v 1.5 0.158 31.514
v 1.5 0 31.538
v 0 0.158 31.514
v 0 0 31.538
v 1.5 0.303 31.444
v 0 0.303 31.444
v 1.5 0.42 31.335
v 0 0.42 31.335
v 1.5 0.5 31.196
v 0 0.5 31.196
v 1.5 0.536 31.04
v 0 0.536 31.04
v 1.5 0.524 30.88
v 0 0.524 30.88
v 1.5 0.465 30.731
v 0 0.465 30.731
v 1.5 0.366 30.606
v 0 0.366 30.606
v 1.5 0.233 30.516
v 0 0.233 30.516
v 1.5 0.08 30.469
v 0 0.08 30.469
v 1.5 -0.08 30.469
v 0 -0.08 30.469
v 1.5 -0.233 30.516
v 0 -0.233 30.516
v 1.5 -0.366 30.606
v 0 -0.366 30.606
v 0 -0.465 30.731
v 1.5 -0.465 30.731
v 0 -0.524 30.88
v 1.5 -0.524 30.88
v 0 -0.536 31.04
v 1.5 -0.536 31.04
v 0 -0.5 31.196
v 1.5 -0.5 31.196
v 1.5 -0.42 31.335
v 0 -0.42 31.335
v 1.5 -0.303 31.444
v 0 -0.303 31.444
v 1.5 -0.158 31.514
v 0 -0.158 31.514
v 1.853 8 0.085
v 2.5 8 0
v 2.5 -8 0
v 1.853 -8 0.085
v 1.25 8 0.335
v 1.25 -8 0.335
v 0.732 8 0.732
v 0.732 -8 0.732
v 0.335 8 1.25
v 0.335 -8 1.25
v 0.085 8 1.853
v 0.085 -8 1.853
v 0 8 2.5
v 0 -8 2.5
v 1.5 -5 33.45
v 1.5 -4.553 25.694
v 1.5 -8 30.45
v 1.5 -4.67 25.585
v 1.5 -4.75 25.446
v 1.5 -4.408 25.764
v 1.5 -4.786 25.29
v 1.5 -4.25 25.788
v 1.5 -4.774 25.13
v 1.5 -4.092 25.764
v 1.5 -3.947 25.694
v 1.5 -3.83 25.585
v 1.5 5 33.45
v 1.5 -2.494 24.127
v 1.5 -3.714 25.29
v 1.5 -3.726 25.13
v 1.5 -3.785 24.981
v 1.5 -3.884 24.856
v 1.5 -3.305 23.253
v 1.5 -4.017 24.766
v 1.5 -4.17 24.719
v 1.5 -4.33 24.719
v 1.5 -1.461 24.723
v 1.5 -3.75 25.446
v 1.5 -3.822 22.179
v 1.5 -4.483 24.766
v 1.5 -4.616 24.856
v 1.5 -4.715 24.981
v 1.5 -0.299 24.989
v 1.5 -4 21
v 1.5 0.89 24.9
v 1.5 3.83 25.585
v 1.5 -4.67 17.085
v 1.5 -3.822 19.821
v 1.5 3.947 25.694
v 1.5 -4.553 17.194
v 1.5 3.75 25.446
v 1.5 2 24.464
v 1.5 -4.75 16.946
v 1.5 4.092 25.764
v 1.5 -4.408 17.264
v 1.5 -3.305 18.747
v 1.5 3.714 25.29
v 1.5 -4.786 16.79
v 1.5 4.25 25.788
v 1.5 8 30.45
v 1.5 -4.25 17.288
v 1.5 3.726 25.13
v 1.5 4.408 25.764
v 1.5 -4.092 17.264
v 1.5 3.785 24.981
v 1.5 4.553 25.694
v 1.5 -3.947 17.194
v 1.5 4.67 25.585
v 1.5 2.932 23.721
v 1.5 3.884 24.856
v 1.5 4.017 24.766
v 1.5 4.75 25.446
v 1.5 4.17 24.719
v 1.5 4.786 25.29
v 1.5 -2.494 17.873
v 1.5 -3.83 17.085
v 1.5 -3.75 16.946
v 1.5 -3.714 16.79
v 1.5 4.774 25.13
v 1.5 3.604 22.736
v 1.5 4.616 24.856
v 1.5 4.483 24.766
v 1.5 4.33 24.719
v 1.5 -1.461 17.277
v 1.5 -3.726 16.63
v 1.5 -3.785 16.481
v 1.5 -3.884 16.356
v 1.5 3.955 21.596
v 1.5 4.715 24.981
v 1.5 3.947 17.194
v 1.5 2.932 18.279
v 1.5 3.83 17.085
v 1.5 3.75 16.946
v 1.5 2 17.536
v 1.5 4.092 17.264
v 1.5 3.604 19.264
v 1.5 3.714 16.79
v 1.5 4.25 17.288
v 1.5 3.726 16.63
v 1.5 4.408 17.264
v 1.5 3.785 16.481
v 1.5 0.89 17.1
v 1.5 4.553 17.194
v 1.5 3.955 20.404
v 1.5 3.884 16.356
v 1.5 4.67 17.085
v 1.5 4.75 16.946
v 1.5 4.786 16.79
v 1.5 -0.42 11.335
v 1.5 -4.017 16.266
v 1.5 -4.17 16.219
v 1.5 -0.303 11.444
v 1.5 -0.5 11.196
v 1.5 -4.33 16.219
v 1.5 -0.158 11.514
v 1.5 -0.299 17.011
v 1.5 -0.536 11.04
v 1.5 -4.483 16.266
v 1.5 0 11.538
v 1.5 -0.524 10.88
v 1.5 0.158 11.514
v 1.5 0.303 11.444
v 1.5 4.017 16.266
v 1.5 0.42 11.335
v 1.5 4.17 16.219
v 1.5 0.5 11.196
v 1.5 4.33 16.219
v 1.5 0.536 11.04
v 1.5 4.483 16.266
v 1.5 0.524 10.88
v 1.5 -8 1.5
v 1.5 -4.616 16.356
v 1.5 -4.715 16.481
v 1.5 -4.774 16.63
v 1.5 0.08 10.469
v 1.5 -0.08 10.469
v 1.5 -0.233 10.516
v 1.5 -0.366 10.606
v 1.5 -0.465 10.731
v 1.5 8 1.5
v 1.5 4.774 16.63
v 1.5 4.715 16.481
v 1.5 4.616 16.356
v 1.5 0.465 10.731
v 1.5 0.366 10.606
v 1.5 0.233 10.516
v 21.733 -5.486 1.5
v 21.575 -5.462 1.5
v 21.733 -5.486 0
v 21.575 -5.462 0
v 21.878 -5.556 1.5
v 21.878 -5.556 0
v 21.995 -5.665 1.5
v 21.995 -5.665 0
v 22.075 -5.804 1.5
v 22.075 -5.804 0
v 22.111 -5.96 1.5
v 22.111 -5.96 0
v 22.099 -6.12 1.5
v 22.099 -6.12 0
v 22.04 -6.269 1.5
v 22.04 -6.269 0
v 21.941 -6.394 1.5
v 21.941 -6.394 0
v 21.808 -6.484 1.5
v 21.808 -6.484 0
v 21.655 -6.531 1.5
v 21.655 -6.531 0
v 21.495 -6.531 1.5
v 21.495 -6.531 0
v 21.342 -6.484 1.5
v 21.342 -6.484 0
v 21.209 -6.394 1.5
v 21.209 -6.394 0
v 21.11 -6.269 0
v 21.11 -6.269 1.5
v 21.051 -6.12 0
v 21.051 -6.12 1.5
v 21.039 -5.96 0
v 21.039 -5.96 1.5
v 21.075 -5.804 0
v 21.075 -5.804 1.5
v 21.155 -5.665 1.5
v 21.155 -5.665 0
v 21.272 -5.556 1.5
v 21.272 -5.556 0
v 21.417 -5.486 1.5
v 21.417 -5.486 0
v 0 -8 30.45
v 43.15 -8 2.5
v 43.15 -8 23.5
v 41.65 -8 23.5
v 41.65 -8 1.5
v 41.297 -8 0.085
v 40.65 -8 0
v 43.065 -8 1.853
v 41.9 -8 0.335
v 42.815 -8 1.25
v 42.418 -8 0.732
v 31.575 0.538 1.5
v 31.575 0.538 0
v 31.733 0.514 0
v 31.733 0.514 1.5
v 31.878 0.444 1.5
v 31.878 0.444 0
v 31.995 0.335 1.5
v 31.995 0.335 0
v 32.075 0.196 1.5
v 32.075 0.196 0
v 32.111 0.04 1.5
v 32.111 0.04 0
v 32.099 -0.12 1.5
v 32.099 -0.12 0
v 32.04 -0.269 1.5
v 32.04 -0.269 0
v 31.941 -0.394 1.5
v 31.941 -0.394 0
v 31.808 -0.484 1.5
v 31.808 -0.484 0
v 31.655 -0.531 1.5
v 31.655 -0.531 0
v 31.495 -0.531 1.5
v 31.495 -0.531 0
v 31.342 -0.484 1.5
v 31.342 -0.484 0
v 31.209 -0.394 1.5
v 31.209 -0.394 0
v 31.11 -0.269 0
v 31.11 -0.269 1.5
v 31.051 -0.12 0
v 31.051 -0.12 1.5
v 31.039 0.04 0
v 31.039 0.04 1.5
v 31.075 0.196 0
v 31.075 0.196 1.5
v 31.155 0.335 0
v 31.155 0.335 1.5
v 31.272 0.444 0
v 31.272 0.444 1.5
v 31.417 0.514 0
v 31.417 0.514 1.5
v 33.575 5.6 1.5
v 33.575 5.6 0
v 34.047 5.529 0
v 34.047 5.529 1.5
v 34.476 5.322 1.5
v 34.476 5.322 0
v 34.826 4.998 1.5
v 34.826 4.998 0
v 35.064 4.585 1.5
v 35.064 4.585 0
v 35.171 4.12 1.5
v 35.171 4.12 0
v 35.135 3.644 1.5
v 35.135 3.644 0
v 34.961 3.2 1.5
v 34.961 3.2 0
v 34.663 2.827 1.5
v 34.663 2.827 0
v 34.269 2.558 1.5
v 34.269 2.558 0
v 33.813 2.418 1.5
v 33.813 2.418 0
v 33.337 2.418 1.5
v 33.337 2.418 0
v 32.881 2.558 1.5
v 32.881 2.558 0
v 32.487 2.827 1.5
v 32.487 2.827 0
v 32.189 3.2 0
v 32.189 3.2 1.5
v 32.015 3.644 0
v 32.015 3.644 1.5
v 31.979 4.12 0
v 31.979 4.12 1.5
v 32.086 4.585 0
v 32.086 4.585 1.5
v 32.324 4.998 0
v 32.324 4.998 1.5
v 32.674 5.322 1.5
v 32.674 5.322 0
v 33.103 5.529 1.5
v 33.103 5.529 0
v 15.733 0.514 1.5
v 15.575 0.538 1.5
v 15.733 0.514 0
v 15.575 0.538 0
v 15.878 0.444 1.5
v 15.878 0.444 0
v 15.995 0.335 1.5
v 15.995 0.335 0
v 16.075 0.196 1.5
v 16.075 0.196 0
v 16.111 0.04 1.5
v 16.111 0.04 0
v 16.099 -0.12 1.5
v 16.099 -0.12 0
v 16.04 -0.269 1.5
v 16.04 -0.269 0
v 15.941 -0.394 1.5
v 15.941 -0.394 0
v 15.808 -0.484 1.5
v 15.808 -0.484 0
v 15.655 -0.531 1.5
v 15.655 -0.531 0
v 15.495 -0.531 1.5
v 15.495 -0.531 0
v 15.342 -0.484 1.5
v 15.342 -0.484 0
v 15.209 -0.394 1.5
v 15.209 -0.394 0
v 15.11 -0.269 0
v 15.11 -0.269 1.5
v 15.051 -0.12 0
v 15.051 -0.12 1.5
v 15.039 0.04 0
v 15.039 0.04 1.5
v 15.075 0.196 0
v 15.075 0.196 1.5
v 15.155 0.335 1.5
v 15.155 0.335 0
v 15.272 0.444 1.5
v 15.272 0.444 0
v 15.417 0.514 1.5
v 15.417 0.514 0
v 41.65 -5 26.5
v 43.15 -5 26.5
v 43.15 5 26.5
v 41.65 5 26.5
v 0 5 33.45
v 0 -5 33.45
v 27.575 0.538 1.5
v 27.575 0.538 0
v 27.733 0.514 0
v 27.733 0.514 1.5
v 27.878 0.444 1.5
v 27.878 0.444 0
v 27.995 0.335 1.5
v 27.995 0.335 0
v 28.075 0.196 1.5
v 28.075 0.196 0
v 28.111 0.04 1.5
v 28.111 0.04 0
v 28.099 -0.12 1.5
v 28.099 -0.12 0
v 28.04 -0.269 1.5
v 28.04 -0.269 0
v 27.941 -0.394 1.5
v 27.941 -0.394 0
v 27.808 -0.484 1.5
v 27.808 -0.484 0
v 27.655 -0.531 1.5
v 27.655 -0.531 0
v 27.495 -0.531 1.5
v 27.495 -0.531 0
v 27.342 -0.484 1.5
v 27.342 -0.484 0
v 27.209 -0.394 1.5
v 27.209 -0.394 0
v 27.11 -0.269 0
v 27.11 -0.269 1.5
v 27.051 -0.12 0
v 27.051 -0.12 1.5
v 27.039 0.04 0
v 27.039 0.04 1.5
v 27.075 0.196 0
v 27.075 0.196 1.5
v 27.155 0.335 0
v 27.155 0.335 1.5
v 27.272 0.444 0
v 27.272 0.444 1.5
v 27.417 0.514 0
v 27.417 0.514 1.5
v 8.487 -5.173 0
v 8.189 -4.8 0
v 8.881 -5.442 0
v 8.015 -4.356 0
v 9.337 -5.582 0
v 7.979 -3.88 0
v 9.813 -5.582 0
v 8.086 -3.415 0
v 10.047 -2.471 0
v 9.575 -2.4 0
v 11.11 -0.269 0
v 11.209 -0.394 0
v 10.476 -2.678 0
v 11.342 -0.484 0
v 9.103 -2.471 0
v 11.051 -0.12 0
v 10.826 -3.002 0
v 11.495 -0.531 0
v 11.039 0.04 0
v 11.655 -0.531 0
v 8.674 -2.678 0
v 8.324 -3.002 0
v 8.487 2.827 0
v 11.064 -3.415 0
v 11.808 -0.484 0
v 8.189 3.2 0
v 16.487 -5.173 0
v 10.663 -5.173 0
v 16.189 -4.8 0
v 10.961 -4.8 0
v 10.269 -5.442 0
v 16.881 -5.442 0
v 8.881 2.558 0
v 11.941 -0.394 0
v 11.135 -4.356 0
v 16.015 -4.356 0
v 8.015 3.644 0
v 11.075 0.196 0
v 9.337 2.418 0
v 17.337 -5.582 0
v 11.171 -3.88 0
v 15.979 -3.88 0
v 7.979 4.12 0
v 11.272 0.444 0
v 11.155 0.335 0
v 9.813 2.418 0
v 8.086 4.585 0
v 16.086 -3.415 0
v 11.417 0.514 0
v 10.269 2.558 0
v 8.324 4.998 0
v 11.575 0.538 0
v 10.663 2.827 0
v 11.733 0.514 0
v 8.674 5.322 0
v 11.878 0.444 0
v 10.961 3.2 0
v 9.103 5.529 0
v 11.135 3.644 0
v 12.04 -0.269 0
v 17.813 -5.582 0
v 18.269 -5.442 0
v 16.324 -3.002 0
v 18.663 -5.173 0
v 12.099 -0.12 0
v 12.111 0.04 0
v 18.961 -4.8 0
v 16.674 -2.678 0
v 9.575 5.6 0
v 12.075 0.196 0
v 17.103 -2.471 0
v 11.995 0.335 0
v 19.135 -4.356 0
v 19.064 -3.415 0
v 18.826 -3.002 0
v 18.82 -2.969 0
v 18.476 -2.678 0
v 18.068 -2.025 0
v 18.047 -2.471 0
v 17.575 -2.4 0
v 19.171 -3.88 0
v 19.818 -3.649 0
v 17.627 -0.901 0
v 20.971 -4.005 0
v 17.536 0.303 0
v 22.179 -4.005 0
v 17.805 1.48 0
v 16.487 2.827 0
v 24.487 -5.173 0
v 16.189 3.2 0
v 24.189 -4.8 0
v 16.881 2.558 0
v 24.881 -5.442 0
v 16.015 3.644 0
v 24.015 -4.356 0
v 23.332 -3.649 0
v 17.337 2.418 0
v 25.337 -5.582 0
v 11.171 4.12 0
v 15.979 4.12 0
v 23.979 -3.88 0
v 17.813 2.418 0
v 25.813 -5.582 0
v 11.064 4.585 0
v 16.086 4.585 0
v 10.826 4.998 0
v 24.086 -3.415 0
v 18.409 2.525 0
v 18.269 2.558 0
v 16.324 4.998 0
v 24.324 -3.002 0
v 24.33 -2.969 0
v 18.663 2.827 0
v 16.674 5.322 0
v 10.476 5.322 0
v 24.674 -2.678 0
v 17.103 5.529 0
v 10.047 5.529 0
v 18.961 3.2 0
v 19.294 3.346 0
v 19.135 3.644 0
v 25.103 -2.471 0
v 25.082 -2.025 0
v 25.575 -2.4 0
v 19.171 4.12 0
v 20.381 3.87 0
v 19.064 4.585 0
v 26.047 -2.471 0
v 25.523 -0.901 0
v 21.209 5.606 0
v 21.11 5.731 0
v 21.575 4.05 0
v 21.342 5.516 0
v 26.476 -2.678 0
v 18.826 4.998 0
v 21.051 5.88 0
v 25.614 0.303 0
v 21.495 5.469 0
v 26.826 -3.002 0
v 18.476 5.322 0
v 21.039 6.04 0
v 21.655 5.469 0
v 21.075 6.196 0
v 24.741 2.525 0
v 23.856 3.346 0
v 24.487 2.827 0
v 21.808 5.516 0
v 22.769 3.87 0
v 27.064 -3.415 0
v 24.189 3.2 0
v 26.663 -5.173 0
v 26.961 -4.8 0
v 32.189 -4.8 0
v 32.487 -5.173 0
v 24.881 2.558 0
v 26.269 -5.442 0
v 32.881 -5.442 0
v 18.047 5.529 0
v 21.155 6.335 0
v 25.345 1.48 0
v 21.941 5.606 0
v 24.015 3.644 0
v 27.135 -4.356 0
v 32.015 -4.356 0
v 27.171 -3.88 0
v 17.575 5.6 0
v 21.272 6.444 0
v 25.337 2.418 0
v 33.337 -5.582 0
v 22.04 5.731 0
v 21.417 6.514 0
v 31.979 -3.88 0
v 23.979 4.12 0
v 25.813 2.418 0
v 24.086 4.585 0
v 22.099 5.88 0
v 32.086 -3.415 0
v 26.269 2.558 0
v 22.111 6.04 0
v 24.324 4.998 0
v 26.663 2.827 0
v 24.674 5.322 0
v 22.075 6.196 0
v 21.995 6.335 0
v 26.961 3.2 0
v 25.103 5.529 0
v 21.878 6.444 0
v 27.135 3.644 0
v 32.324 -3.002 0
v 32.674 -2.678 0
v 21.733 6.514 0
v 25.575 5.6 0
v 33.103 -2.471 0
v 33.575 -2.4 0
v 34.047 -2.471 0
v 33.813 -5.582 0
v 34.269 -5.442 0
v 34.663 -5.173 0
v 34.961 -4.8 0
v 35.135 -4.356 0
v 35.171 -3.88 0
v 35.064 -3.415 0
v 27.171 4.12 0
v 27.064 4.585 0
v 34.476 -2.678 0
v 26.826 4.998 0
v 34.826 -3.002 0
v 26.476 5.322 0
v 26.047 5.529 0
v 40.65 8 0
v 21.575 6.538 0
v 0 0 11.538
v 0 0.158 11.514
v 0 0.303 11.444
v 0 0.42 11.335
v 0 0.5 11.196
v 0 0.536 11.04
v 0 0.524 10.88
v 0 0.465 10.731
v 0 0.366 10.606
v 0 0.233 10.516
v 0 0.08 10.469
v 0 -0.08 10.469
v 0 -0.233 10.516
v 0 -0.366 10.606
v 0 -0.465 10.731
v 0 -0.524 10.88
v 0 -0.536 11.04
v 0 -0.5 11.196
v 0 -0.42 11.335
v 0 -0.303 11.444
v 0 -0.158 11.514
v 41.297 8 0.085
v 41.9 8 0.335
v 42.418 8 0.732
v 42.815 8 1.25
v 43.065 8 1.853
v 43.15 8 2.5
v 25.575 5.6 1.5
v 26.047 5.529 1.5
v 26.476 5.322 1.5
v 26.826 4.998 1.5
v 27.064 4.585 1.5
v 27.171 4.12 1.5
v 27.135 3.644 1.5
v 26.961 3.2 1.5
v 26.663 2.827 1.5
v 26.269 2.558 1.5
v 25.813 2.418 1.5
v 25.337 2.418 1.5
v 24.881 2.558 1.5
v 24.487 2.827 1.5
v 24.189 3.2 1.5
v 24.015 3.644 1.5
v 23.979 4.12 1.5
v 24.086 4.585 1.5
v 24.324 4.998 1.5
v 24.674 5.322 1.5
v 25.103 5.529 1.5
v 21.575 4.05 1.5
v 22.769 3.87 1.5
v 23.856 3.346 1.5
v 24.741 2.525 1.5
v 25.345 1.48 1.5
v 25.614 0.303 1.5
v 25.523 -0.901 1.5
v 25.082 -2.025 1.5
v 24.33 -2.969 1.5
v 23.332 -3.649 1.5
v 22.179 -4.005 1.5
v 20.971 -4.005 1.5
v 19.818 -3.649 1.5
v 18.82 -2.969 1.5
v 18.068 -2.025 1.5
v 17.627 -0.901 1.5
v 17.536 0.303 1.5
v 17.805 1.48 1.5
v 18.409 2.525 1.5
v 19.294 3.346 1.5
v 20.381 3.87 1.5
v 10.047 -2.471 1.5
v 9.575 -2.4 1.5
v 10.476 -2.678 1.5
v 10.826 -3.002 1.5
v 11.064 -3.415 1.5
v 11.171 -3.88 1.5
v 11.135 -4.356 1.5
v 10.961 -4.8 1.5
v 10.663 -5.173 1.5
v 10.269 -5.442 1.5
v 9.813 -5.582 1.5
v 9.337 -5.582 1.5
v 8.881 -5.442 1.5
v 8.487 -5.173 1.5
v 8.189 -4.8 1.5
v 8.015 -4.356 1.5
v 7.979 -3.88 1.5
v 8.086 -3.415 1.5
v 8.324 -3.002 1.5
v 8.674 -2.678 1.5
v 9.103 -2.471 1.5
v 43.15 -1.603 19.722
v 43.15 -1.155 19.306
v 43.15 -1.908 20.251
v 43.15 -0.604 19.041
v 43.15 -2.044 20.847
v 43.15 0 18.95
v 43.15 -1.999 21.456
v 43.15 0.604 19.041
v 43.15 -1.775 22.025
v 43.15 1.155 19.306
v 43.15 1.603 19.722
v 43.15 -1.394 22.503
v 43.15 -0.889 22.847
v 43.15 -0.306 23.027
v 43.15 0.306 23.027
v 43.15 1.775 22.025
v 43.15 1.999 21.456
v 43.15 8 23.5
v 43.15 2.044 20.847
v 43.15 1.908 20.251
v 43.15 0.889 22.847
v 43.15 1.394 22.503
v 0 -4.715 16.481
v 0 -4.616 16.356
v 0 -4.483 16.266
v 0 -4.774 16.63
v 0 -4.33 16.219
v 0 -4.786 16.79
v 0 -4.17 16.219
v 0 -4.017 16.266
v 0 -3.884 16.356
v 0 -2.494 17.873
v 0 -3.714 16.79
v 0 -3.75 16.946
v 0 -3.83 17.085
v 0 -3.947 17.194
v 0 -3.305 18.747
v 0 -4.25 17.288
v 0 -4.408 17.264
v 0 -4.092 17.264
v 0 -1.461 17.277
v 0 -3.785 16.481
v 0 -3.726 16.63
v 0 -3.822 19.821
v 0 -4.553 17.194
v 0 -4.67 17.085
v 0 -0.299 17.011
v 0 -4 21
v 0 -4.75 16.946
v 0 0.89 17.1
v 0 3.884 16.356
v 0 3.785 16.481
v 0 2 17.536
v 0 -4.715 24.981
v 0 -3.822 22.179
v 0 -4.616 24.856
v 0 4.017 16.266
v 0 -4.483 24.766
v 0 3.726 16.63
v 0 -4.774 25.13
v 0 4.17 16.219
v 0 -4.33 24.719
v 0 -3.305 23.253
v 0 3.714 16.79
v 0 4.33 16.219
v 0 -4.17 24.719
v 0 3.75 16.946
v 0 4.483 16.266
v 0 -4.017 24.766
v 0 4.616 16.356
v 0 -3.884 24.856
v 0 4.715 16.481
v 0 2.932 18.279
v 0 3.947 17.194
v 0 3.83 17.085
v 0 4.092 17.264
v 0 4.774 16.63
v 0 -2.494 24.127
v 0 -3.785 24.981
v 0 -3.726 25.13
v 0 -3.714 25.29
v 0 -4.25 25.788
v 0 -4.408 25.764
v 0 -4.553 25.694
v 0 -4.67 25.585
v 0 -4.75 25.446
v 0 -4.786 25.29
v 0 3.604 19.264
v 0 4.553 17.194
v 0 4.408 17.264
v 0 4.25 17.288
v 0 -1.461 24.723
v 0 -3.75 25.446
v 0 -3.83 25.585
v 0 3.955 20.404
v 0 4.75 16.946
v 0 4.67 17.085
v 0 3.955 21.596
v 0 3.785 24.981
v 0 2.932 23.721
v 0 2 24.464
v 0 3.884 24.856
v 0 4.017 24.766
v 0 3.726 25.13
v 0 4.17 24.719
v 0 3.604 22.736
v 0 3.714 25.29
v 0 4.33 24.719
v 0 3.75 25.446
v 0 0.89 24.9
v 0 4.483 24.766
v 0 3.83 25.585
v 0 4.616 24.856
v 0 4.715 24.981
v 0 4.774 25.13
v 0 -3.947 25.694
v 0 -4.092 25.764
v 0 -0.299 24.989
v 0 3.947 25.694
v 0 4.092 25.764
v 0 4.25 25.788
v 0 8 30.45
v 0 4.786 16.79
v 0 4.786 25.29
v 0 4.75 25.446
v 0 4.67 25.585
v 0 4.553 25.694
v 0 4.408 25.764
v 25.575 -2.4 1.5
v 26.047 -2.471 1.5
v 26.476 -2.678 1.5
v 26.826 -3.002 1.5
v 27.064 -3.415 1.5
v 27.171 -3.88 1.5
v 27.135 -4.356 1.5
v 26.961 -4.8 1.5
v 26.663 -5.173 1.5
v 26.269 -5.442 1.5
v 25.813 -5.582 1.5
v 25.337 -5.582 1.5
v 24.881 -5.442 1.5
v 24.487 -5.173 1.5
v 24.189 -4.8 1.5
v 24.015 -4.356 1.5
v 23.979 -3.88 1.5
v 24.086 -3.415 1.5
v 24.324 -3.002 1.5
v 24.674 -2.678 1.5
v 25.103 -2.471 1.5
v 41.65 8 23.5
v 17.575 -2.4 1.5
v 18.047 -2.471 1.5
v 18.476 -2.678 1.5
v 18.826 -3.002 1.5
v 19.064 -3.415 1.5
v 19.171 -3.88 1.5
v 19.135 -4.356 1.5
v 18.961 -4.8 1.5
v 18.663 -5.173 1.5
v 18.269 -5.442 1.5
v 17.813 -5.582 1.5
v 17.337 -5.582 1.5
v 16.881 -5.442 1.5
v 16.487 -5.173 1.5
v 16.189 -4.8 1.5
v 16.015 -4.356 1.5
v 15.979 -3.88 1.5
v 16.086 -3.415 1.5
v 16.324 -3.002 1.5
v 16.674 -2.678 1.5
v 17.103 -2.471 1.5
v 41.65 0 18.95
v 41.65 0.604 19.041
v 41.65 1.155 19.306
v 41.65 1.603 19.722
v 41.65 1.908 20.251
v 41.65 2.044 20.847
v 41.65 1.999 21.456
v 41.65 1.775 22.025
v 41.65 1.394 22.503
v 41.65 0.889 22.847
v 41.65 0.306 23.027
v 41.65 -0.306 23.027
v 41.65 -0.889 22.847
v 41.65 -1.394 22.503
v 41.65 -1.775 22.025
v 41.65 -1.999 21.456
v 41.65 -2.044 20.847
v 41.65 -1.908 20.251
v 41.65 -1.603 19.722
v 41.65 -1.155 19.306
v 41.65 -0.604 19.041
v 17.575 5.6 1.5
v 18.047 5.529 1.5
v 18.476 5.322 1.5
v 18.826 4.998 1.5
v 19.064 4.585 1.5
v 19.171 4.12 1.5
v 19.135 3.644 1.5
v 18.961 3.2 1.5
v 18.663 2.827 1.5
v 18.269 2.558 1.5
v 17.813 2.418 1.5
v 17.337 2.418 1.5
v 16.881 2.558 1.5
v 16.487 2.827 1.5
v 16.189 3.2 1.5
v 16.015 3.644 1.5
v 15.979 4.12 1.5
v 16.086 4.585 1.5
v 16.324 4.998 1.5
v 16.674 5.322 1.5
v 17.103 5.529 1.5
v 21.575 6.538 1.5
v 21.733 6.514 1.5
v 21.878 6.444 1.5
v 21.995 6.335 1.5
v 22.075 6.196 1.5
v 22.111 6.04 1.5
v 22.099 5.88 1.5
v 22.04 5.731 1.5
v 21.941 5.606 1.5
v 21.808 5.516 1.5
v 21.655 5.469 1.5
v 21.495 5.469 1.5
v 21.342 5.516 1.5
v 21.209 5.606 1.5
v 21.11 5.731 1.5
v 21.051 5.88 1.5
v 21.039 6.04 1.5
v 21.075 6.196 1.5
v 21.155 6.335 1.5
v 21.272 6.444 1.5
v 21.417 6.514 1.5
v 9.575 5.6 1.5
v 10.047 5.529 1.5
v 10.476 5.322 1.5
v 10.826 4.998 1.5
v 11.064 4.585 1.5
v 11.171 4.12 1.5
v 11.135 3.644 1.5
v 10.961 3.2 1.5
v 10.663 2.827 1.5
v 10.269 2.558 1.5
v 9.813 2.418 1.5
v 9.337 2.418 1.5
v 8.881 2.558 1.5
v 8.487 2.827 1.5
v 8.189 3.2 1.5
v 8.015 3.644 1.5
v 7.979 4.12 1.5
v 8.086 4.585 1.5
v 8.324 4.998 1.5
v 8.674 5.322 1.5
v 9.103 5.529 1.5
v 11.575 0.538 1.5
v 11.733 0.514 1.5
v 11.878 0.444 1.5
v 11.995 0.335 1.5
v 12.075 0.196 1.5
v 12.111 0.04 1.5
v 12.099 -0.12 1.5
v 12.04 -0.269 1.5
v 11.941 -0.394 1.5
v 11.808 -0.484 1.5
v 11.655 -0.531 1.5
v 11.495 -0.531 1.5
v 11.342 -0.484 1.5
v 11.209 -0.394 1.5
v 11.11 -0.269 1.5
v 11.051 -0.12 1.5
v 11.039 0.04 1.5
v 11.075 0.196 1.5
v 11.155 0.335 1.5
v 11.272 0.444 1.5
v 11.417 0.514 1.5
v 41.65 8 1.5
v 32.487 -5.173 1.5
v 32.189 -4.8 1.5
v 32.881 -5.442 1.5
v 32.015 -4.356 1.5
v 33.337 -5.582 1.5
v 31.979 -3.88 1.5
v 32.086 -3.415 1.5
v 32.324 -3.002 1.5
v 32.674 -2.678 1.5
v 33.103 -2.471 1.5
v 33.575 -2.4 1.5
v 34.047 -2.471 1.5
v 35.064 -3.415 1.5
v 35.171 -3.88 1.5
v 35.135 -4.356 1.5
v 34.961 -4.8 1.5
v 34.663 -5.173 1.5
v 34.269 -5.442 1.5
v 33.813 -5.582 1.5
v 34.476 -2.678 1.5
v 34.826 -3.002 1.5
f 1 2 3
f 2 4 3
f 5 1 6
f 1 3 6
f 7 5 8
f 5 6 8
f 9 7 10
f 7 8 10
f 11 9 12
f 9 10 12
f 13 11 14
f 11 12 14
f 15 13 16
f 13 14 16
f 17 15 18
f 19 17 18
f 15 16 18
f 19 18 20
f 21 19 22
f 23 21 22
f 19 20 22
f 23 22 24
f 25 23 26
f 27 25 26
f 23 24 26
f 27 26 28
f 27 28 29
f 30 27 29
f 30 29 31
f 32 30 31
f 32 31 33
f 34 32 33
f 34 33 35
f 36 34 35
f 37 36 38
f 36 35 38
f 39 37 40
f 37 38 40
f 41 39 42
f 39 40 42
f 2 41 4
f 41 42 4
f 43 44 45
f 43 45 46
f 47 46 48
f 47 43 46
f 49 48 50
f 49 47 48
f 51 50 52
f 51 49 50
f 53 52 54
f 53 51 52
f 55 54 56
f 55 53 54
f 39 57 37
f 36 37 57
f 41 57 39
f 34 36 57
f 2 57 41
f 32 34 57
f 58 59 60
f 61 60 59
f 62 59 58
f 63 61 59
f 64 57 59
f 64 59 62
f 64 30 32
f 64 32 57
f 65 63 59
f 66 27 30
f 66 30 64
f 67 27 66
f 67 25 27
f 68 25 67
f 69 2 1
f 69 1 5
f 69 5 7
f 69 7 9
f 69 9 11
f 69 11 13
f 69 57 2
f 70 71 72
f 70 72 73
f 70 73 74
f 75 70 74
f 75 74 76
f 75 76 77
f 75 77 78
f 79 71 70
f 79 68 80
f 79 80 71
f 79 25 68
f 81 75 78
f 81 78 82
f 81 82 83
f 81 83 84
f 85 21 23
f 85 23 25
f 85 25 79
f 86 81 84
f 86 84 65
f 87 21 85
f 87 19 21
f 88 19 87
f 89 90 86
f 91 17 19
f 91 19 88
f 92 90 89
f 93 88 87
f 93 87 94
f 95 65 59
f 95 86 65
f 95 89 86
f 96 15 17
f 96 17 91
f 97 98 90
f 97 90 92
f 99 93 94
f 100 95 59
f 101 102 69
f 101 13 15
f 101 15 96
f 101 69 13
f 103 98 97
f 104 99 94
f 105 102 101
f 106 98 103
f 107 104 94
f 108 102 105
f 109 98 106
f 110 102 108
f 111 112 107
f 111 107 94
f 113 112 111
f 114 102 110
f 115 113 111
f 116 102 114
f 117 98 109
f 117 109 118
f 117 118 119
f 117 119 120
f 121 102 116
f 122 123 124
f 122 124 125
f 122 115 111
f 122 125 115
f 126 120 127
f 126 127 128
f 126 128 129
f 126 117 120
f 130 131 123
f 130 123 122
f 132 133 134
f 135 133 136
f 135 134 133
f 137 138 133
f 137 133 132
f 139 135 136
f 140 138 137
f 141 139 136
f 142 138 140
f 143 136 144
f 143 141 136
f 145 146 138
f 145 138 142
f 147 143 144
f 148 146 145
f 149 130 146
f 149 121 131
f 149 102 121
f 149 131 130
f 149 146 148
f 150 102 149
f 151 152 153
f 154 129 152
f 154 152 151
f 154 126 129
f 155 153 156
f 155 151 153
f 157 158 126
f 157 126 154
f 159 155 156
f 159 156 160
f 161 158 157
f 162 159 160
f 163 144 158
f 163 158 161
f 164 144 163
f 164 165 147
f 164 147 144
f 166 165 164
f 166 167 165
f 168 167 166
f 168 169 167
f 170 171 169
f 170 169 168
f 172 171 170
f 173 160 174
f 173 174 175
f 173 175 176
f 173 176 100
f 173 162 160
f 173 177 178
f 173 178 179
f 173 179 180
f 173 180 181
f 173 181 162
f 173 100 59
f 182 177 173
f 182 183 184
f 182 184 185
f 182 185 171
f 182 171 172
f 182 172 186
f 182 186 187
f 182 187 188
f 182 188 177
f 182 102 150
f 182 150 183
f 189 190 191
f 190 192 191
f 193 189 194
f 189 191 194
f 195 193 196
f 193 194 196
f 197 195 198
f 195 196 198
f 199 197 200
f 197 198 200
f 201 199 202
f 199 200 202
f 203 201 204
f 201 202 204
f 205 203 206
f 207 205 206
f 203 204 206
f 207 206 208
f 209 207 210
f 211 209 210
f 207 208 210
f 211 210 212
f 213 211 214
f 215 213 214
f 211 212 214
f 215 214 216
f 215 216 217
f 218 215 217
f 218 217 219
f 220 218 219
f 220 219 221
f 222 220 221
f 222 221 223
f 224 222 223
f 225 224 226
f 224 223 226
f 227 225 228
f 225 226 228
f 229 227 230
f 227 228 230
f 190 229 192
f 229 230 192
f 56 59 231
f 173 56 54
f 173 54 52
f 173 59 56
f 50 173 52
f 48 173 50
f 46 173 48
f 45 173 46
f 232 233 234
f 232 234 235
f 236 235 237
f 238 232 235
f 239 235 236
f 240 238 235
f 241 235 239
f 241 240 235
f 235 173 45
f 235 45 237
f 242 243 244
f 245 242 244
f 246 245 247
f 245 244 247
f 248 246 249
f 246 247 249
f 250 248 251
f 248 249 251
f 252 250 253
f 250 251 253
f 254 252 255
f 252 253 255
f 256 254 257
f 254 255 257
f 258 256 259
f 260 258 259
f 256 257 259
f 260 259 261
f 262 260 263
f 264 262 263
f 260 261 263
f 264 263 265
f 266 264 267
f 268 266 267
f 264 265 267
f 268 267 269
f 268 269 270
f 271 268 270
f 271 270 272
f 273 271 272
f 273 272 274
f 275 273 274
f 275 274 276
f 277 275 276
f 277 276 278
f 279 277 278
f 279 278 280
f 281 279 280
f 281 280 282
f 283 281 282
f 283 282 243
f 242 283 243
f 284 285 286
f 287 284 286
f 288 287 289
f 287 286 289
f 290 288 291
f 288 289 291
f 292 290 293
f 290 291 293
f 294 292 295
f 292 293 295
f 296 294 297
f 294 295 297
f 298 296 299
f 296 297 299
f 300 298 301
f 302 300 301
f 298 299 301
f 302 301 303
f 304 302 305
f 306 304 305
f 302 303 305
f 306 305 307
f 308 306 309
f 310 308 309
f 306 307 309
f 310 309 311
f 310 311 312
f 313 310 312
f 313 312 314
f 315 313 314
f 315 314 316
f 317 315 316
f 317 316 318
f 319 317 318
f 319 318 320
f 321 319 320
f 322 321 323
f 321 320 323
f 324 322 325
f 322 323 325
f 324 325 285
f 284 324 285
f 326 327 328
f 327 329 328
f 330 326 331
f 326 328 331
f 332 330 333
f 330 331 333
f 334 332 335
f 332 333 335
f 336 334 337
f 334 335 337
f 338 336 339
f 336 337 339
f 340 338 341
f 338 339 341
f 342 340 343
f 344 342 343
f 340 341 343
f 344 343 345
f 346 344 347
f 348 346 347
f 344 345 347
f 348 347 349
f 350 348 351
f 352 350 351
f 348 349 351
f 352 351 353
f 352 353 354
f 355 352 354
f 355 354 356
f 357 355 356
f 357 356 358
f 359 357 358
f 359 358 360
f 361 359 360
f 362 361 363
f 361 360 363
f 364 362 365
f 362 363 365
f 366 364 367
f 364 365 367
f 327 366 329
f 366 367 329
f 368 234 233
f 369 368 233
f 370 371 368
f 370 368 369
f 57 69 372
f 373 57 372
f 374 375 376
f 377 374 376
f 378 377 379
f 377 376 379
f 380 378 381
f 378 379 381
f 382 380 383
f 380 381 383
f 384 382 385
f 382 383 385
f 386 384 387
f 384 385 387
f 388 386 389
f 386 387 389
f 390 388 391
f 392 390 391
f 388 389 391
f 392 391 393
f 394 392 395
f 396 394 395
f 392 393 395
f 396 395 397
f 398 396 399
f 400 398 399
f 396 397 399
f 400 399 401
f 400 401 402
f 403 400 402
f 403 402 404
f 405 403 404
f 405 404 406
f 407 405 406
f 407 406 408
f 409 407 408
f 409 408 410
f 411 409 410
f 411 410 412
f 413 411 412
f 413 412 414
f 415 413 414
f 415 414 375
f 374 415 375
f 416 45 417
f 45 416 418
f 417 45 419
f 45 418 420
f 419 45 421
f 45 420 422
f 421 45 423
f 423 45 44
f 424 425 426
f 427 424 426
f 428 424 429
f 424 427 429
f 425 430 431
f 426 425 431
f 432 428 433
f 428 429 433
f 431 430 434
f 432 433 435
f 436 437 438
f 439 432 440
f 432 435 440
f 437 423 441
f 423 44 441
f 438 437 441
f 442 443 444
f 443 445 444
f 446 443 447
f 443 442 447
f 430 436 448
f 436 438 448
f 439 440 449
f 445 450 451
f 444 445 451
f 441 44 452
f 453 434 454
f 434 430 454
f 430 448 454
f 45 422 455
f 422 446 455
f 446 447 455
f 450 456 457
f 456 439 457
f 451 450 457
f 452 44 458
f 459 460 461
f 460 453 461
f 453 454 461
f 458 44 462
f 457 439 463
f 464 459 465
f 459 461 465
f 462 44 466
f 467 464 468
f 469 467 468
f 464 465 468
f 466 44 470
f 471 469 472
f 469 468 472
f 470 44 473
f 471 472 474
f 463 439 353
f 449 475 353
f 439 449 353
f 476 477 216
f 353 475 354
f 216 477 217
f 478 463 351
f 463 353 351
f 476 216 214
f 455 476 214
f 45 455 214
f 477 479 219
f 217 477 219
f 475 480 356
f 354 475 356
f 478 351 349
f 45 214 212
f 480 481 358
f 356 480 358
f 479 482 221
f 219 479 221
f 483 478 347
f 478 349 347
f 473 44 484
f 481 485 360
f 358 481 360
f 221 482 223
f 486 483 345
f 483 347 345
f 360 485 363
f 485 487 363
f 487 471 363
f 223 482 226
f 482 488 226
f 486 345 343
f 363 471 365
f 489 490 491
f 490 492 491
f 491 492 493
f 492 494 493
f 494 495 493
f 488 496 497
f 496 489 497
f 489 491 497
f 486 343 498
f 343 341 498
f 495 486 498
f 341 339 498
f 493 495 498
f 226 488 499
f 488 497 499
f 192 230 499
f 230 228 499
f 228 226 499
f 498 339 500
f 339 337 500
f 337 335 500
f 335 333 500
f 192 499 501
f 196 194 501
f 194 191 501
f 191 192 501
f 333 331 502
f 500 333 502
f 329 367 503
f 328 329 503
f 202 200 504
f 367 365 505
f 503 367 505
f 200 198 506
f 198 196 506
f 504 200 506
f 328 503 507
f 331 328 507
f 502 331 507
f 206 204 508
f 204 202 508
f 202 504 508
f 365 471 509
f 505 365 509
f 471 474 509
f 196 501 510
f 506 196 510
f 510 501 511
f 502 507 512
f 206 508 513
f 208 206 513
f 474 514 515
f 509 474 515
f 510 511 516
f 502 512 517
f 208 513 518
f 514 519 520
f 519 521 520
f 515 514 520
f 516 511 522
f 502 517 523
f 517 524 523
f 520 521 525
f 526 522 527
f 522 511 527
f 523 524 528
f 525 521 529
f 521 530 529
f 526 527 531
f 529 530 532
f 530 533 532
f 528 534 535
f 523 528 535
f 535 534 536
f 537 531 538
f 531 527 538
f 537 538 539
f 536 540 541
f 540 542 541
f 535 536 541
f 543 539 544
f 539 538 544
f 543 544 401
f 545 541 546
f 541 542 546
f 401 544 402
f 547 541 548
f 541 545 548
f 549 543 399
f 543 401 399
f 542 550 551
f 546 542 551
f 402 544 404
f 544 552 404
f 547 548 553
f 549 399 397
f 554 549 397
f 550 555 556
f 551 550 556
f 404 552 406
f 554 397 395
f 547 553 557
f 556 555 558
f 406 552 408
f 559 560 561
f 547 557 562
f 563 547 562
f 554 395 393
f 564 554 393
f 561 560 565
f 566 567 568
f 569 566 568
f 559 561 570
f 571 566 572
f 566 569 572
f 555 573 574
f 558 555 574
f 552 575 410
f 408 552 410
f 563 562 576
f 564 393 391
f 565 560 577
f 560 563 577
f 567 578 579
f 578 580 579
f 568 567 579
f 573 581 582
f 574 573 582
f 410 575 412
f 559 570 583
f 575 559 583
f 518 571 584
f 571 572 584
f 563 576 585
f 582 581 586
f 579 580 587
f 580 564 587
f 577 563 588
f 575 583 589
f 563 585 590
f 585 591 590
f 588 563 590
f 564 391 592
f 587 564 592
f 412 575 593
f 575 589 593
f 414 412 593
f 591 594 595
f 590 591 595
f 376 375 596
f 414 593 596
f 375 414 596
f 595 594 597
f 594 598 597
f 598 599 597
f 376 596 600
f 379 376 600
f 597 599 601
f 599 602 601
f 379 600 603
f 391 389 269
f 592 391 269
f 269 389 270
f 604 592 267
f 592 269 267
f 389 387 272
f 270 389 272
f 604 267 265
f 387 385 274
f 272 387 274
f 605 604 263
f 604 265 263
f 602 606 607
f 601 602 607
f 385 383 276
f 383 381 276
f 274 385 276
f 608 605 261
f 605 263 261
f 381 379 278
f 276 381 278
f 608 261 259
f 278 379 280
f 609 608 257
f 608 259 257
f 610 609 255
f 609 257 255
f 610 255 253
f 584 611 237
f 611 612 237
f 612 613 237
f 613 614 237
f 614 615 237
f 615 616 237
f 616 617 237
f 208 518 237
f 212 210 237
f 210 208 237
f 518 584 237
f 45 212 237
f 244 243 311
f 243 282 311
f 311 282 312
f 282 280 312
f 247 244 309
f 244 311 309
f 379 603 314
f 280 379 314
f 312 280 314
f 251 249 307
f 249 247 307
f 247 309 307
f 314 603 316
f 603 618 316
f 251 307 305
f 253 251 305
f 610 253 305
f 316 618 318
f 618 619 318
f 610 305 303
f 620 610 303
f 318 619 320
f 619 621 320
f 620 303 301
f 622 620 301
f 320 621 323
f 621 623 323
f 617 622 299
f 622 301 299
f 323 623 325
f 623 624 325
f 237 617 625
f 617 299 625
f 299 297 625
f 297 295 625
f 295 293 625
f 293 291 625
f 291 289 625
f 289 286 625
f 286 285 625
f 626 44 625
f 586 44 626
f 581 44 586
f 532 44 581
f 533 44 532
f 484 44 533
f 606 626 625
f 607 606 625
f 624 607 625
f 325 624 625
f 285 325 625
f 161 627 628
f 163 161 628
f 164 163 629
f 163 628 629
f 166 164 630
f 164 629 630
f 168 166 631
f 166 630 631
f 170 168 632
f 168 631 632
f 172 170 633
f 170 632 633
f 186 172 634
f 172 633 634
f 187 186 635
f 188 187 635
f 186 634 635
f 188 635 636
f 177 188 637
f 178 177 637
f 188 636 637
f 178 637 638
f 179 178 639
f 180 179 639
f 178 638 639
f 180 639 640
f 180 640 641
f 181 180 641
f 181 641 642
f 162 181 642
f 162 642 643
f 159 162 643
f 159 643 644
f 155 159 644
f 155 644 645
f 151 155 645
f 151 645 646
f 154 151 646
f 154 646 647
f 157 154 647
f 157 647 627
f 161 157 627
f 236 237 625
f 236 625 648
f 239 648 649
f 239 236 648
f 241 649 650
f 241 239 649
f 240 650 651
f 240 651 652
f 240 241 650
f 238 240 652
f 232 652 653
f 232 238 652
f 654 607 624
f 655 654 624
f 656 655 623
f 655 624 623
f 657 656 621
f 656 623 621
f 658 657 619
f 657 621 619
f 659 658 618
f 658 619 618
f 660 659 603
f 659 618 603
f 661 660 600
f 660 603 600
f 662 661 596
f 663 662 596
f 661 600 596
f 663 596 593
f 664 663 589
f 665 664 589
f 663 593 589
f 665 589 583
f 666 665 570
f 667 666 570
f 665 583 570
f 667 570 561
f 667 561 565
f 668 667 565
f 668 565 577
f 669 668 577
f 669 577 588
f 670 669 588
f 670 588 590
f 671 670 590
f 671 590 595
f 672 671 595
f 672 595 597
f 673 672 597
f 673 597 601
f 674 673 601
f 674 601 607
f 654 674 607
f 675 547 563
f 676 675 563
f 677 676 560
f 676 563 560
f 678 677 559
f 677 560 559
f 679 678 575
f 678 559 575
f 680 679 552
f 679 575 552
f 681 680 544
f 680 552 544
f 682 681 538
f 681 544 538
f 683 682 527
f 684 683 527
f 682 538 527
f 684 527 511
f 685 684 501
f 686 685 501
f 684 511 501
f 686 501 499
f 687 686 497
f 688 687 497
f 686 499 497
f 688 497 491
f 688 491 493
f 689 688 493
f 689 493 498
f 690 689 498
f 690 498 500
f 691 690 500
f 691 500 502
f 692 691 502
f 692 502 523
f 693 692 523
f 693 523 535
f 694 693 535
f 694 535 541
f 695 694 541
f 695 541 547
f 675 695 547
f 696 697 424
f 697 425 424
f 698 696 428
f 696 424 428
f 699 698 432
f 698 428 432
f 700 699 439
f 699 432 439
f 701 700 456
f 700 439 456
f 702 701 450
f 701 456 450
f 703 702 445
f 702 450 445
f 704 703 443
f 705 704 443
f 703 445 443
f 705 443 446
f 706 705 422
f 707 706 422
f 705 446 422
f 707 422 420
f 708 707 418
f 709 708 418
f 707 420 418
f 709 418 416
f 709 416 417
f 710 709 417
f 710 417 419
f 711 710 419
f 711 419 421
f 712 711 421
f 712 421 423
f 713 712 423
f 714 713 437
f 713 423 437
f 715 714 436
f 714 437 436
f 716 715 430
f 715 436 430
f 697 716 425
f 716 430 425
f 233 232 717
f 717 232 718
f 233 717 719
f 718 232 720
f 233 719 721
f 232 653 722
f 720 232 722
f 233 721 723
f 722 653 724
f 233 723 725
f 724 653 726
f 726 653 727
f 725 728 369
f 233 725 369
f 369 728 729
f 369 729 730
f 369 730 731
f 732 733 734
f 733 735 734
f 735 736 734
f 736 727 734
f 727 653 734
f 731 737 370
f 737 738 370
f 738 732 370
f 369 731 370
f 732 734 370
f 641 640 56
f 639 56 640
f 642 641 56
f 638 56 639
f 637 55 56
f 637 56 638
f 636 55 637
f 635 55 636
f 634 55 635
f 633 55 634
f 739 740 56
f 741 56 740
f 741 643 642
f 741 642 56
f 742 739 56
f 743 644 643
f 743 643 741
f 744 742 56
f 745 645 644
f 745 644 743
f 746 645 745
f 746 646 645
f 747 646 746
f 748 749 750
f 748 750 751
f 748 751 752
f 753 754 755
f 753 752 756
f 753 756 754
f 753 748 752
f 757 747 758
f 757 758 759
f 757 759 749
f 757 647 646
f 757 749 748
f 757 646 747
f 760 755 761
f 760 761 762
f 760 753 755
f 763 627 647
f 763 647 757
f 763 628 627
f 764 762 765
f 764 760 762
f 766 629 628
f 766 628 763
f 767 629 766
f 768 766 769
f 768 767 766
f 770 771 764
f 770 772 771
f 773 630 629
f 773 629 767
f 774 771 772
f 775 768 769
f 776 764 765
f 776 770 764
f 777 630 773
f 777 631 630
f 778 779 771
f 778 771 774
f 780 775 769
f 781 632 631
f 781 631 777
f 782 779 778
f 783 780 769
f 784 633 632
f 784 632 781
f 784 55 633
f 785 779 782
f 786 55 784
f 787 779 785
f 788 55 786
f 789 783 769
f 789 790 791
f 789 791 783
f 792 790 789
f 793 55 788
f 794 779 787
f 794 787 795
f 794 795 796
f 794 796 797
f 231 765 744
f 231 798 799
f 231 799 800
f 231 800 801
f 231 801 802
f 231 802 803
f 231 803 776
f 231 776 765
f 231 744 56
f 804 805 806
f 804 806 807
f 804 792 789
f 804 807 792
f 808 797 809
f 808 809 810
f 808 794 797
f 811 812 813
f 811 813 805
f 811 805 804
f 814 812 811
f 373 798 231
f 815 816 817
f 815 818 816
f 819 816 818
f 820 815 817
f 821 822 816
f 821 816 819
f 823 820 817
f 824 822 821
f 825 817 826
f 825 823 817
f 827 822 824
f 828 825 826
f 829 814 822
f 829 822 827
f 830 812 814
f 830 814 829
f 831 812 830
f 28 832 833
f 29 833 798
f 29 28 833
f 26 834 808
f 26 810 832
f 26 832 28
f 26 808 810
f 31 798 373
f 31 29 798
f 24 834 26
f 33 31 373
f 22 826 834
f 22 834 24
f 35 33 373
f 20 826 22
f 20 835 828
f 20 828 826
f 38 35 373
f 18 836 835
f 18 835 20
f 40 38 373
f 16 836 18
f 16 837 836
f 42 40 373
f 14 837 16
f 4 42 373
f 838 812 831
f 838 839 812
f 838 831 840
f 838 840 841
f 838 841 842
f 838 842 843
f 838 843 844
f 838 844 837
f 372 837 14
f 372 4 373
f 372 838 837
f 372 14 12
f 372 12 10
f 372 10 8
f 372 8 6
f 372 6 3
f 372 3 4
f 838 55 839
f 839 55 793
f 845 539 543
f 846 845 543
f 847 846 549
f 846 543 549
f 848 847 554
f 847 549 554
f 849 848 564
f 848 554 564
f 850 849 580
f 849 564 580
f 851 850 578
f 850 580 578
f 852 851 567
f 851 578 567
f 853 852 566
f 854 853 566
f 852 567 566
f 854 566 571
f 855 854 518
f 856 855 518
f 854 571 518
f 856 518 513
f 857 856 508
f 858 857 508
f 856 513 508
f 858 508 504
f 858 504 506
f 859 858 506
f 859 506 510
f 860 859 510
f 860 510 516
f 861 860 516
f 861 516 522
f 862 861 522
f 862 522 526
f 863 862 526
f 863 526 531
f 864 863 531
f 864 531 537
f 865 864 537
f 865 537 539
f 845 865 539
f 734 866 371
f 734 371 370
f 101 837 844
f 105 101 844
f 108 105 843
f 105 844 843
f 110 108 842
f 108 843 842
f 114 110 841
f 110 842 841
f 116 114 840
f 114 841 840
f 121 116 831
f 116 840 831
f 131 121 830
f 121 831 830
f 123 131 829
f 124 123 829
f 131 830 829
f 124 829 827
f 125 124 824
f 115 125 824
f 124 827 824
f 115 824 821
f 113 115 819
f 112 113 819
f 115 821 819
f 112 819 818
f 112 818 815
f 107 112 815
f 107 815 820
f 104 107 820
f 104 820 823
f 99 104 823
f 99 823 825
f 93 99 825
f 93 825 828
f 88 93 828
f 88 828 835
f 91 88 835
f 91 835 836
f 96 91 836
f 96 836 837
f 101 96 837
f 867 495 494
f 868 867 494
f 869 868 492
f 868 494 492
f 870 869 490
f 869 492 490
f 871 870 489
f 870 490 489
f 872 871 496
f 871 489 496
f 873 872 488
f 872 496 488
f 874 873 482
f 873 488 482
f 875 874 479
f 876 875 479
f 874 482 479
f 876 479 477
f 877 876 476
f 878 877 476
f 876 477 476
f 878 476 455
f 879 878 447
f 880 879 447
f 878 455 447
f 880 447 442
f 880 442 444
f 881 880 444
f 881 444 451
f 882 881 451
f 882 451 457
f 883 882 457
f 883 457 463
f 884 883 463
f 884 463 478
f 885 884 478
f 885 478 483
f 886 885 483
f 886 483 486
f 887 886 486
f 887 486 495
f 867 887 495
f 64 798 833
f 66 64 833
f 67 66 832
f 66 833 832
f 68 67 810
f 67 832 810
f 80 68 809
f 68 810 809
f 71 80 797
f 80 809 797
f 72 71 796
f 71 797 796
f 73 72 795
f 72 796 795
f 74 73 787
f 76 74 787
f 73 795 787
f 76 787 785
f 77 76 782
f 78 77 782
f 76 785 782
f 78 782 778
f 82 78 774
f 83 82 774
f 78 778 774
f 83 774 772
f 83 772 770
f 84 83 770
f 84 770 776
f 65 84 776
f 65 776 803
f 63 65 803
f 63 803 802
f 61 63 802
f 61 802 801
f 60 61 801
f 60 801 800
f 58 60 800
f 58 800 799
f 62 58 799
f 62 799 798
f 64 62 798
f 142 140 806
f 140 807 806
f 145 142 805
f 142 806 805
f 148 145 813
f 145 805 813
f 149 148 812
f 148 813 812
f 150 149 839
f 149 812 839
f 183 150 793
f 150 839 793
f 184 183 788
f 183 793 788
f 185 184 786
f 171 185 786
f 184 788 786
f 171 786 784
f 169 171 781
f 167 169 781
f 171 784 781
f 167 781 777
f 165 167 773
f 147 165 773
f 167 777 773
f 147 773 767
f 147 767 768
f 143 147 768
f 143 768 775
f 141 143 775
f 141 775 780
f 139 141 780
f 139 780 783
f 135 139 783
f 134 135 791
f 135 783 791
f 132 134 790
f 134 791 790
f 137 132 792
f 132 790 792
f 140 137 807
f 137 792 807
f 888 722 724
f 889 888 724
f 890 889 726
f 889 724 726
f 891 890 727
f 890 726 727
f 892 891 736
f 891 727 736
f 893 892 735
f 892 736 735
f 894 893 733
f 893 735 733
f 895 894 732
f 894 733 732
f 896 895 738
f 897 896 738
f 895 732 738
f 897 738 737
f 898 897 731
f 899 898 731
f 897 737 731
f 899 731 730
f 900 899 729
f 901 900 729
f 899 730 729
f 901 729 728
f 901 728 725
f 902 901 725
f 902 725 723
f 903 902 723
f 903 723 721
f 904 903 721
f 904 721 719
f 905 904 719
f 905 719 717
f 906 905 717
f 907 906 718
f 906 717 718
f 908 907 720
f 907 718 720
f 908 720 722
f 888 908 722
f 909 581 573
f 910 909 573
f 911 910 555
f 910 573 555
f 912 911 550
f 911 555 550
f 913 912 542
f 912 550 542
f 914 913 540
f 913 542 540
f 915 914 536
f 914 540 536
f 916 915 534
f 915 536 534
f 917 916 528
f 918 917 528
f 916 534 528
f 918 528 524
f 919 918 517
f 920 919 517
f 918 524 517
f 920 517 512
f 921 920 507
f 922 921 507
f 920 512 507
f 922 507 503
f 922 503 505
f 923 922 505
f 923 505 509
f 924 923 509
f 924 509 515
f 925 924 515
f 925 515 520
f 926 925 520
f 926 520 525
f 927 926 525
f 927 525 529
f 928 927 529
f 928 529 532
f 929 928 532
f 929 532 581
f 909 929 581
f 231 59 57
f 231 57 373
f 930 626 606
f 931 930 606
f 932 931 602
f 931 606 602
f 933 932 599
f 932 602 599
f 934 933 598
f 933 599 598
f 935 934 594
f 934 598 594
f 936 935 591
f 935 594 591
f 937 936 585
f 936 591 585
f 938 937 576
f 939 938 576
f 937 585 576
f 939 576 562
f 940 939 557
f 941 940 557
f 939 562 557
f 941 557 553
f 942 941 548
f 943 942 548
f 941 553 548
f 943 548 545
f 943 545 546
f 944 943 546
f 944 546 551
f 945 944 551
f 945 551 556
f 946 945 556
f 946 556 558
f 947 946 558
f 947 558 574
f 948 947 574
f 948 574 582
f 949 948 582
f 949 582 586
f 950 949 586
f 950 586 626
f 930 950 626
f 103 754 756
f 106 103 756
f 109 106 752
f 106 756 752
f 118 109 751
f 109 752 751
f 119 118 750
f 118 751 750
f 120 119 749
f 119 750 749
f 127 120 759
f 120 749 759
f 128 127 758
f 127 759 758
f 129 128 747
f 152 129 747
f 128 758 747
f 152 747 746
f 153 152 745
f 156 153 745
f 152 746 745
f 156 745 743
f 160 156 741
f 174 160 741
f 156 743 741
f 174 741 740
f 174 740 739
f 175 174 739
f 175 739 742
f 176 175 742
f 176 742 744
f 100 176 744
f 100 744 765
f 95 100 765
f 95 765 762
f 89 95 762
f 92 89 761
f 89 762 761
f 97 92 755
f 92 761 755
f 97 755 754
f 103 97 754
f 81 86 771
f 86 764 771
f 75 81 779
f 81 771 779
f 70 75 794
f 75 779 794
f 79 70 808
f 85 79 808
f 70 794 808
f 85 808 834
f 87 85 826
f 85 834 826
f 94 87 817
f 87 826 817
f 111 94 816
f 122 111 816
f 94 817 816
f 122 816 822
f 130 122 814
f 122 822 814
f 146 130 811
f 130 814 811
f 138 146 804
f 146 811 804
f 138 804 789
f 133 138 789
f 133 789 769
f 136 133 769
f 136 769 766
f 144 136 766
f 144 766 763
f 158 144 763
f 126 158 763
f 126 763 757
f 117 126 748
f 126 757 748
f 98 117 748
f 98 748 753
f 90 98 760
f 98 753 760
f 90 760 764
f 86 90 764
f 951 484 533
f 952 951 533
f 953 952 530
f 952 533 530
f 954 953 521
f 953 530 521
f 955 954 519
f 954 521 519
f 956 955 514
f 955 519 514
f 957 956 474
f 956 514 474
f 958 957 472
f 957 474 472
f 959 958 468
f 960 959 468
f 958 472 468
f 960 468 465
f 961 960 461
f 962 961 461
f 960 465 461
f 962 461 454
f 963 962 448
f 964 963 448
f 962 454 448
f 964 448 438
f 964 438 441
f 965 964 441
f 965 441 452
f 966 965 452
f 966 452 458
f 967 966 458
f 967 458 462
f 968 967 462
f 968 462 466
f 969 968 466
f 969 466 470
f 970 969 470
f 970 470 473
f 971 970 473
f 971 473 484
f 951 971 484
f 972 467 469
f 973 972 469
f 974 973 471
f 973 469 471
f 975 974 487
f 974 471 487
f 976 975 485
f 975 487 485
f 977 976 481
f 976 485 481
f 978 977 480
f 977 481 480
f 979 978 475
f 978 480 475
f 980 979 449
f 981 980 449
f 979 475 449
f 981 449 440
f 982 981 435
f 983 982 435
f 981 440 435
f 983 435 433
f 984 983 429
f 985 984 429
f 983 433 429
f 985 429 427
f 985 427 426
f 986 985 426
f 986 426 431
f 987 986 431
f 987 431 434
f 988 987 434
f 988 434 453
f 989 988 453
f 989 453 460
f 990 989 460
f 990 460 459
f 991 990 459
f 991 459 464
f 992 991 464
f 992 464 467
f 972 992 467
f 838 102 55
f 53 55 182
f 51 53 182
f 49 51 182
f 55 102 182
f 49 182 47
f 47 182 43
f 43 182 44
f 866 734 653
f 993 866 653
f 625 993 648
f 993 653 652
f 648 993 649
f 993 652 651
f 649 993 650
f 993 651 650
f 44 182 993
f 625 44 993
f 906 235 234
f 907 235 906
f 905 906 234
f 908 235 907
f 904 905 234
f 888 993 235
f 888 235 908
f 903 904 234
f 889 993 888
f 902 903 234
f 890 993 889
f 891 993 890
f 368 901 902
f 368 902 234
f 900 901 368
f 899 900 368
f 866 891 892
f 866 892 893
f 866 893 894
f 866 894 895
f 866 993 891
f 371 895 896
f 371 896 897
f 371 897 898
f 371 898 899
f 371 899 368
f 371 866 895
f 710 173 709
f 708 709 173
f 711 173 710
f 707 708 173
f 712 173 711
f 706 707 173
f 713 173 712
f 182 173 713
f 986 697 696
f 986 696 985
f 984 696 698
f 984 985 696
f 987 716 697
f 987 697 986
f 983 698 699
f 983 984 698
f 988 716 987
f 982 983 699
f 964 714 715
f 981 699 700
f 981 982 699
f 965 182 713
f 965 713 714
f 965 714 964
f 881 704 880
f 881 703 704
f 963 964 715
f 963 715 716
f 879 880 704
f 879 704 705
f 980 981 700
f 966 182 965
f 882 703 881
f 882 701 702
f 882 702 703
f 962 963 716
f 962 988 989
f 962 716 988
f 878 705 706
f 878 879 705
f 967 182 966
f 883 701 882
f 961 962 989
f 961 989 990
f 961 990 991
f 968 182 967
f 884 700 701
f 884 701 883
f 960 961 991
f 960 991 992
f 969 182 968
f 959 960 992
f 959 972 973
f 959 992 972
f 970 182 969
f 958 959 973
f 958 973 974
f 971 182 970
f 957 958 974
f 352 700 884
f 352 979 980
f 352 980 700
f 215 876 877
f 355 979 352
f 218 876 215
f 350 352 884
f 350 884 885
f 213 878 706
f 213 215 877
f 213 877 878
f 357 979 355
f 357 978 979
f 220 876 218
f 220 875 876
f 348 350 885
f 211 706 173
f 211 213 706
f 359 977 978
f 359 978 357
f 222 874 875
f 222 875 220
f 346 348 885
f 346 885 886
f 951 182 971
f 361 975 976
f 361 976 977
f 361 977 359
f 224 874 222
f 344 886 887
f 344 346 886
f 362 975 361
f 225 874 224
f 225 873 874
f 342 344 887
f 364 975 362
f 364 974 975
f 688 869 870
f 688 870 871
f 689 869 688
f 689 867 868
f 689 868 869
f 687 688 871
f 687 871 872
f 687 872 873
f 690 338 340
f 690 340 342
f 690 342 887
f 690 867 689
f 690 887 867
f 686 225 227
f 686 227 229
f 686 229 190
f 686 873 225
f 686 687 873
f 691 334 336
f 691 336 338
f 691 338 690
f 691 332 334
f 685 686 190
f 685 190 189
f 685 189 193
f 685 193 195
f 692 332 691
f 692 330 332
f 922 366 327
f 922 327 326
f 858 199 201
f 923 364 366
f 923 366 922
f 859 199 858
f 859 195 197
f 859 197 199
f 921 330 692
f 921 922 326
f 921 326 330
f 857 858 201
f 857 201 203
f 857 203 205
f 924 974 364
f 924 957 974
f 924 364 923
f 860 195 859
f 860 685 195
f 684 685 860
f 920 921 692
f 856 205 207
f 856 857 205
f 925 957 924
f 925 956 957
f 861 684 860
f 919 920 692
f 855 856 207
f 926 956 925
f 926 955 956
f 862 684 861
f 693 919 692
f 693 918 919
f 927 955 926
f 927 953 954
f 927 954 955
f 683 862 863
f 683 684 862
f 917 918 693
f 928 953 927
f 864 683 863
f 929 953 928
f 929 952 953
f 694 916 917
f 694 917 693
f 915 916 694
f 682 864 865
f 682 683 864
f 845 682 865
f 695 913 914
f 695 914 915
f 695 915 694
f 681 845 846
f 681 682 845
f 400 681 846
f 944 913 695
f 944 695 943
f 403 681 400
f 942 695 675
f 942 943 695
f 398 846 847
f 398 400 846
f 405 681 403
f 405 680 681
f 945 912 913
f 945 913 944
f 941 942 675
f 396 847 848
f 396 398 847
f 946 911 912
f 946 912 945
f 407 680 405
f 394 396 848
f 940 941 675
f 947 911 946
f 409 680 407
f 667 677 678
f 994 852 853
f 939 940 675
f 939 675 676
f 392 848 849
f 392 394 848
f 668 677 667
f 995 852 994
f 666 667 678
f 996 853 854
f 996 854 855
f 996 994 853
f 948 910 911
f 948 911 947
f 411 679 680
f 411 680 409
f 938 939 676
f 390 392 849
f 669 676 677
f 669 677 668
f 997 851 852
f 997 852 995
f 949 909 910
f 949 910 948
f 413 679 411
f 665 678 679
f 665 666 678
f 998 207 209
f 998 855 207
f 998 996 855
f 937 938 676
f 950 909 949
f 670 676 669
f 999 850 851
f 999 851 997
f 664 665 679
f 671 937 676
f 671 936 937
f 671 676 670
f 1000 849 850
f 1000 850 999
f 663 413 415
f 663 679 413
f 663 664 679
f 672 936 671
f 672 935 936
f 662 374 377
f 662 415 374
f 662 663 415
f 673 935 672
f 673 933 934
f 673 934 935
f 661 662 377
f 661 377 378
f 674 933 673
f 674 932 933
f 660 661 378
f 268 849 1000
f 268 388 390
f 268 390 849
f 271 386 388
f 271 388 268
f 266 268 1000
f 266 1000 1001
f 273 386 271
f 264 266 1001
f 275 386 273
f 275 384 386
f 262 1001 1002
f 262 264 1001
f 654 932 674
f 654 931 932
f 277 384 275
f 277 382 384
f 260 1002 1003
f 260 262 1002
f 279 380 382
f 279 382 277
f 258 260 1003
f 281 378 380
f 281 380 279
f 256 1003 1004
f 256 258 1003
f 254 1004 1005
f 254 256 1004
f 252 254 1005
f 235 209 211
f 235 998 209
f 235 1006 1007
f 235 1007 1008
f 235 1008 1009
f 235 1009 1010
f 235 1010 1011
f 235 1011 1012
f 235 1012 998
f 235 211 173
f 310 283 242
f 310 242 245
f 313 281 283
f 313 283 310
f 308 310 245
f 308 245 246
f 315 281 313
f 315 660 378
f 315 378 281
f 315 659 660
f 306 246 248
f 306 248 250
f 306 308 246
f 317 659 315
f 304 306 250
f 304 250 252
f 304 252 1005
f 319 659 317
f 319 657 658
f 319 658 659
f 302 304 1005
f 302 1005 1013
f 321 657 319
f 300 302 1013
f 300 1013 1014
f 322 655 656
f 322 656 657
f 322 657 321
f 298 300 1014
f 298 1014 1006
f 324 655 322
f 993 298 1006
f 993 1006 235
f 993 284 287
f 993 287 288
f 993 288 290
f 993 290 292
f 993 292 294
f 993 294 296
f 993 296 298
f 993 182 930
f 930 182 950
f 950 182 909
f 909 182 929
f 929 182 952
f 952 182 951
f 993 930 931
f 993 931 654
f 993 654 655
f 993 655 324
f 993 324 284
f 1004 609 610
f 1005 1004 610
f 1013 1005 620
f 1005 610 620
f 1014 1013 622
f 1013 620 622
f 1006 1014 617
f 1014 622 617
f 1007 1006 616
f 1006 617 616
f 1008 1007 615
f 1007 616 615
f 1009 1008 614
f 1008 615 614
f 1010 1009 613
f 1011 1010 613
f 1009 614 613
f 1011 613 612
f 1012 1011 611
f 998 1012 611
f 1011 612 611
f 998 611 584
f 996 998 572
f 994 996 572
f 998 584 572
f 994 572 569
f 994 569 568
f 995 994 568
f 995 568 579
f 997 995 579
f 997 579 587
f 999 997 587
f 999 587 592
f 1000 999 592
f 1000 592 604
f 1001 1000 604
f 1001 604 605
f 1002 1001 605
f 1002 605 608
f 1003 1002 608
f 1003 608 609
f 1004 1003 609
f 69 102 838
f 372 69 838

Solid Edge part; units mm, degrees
sketch "Sketch1" plane through (0, 0, 0) normal (0, -1, 0) x (1, 0, 0)
  line L0 (0, 0) -> (43.15, 0)
  line L1 (43.15, 0) -> (43.15, 26.5)
  line L2 (41.65, 26.5) -> (43.15, 26.5)
  line L3 (41.65, 1.5) -> (41.65, 26.5)
  line L4 (1.5, 1.5) -> (41.65, 1.5)
  line L5 (1.5, 33.45) -> (1.5, 1.5)
  line L6 (1.5, 33.45) -> (0, 33.45)
  line L7 (0, 0) -> (0, 33.45)
  dimension "D1" = 43.15
  dimension "D2" = 33.45
  dimension "D3" = 26.5
  dimension "D4" = 1.5
extrude "Protrusion1" add sketch "Sketch1" along normal mid plane 16
hole "Hole_1" at (43.15, 0, 21) direction (-1, 0, 0) diameter 4.1 end through all
hole "Hole_2" at (0, 0, 11) direction (1, 0, 0) diameter 1.075 end up to next
hole "Hole1" at (0, 0, 31) direction (1, 0, 0) diameter 1.075 end up to next
sketch "Sketch2" plane through (0, 0, 16.725) normal (-1, 0, 0) x (0, -1, 0)
  circle A0 centre (0, 4.275) radius 4
  dimension "D1" = 8
extrude "Cutout1" cut sketch "Sketch2" against normal up to next
hole "Hole_4" at (0, -4.25, 25.25) direction (1, 0, 0) diameter 1.075 end up to next
hole "Hole2" at (0, -4.25, 16.75) direction (1, 0, 0) diameter 1.075 end up to next
hole "Hole3" at (0, 4.25, 16.75) direction (1, 0, 0) diameter 1.075 end up to next
hole "Hole4" at (0, 4.25, 25.25) direction (1, 0, 0) diameter 1.075 end up to next
chamfer "Chamfer_1" distance 3 angle 45 4 edges at (0.75, 8, 33.45) (0.75, -8, 33.45) (42.4, 8, 26.5) (42.4, -8, 26.5)
fillet "Round_1" radius 2.5 2 edges at (0, 0, 0) (43.15, 0, 0)
hole "Hole_8" at (9.575, 4, 0) direction (0, 0, 1) diameter 3.2 end up to next
hole "Hole5" at (9.575, -4, 0) direction (0, 0, 1) diameter 3.2 end up to next
hole "Hole6" at (17.575, -4, 0) direction (0, 0, 1) diameter 3.2 end up to next
hole "Hole7" at (17.575, 4, 0) direction (0, 0, 1) diameter 3.2 end up to next
hole "Hole8" at (25.575, 4, 0) direction (0, 0, 1) diameter 3.2 end up to next
hole "Hole9" at (25.575, -4, 0) direction (0, 0, 1) diameter 3.2 end up to next
hole "Hole10" at (33.575, -4, 0) direction (0, 0, 1) diameter 3.2 end up to next
hole "Hole11" at (33.575, 4, 0) direction (0, 0, 1) diameter 3.2 end up to next
hole "Hole_16" at (21.575, 0, 0) direction (0, 0, 1) diameter 8.1 end up to next
hole "Hole_17" at (21.575, 6, 0) direction (0, 0, 1) diameter 1.075 end up to next
hole "Hole12" at (21.575, -6, 0) direction (0, 0, 1) diameter 1.075 end up to next
hole "Hole13" at (15.575, 0, 0) direction (0, 0, 1) diameter 1.075 end up to next
hole "Hole14" at (27.575, 0, 0) direction (0, 0, 1) diameter 1.075 end up to next
hole "Hole15" at (31.575, 0, 0) direction (0, 0, 1) diameter 1.075 end up to next
hole "Hole16" at (11.575, 0, 0) direction (0, 0, 1) diameter 1.075 end up to next
